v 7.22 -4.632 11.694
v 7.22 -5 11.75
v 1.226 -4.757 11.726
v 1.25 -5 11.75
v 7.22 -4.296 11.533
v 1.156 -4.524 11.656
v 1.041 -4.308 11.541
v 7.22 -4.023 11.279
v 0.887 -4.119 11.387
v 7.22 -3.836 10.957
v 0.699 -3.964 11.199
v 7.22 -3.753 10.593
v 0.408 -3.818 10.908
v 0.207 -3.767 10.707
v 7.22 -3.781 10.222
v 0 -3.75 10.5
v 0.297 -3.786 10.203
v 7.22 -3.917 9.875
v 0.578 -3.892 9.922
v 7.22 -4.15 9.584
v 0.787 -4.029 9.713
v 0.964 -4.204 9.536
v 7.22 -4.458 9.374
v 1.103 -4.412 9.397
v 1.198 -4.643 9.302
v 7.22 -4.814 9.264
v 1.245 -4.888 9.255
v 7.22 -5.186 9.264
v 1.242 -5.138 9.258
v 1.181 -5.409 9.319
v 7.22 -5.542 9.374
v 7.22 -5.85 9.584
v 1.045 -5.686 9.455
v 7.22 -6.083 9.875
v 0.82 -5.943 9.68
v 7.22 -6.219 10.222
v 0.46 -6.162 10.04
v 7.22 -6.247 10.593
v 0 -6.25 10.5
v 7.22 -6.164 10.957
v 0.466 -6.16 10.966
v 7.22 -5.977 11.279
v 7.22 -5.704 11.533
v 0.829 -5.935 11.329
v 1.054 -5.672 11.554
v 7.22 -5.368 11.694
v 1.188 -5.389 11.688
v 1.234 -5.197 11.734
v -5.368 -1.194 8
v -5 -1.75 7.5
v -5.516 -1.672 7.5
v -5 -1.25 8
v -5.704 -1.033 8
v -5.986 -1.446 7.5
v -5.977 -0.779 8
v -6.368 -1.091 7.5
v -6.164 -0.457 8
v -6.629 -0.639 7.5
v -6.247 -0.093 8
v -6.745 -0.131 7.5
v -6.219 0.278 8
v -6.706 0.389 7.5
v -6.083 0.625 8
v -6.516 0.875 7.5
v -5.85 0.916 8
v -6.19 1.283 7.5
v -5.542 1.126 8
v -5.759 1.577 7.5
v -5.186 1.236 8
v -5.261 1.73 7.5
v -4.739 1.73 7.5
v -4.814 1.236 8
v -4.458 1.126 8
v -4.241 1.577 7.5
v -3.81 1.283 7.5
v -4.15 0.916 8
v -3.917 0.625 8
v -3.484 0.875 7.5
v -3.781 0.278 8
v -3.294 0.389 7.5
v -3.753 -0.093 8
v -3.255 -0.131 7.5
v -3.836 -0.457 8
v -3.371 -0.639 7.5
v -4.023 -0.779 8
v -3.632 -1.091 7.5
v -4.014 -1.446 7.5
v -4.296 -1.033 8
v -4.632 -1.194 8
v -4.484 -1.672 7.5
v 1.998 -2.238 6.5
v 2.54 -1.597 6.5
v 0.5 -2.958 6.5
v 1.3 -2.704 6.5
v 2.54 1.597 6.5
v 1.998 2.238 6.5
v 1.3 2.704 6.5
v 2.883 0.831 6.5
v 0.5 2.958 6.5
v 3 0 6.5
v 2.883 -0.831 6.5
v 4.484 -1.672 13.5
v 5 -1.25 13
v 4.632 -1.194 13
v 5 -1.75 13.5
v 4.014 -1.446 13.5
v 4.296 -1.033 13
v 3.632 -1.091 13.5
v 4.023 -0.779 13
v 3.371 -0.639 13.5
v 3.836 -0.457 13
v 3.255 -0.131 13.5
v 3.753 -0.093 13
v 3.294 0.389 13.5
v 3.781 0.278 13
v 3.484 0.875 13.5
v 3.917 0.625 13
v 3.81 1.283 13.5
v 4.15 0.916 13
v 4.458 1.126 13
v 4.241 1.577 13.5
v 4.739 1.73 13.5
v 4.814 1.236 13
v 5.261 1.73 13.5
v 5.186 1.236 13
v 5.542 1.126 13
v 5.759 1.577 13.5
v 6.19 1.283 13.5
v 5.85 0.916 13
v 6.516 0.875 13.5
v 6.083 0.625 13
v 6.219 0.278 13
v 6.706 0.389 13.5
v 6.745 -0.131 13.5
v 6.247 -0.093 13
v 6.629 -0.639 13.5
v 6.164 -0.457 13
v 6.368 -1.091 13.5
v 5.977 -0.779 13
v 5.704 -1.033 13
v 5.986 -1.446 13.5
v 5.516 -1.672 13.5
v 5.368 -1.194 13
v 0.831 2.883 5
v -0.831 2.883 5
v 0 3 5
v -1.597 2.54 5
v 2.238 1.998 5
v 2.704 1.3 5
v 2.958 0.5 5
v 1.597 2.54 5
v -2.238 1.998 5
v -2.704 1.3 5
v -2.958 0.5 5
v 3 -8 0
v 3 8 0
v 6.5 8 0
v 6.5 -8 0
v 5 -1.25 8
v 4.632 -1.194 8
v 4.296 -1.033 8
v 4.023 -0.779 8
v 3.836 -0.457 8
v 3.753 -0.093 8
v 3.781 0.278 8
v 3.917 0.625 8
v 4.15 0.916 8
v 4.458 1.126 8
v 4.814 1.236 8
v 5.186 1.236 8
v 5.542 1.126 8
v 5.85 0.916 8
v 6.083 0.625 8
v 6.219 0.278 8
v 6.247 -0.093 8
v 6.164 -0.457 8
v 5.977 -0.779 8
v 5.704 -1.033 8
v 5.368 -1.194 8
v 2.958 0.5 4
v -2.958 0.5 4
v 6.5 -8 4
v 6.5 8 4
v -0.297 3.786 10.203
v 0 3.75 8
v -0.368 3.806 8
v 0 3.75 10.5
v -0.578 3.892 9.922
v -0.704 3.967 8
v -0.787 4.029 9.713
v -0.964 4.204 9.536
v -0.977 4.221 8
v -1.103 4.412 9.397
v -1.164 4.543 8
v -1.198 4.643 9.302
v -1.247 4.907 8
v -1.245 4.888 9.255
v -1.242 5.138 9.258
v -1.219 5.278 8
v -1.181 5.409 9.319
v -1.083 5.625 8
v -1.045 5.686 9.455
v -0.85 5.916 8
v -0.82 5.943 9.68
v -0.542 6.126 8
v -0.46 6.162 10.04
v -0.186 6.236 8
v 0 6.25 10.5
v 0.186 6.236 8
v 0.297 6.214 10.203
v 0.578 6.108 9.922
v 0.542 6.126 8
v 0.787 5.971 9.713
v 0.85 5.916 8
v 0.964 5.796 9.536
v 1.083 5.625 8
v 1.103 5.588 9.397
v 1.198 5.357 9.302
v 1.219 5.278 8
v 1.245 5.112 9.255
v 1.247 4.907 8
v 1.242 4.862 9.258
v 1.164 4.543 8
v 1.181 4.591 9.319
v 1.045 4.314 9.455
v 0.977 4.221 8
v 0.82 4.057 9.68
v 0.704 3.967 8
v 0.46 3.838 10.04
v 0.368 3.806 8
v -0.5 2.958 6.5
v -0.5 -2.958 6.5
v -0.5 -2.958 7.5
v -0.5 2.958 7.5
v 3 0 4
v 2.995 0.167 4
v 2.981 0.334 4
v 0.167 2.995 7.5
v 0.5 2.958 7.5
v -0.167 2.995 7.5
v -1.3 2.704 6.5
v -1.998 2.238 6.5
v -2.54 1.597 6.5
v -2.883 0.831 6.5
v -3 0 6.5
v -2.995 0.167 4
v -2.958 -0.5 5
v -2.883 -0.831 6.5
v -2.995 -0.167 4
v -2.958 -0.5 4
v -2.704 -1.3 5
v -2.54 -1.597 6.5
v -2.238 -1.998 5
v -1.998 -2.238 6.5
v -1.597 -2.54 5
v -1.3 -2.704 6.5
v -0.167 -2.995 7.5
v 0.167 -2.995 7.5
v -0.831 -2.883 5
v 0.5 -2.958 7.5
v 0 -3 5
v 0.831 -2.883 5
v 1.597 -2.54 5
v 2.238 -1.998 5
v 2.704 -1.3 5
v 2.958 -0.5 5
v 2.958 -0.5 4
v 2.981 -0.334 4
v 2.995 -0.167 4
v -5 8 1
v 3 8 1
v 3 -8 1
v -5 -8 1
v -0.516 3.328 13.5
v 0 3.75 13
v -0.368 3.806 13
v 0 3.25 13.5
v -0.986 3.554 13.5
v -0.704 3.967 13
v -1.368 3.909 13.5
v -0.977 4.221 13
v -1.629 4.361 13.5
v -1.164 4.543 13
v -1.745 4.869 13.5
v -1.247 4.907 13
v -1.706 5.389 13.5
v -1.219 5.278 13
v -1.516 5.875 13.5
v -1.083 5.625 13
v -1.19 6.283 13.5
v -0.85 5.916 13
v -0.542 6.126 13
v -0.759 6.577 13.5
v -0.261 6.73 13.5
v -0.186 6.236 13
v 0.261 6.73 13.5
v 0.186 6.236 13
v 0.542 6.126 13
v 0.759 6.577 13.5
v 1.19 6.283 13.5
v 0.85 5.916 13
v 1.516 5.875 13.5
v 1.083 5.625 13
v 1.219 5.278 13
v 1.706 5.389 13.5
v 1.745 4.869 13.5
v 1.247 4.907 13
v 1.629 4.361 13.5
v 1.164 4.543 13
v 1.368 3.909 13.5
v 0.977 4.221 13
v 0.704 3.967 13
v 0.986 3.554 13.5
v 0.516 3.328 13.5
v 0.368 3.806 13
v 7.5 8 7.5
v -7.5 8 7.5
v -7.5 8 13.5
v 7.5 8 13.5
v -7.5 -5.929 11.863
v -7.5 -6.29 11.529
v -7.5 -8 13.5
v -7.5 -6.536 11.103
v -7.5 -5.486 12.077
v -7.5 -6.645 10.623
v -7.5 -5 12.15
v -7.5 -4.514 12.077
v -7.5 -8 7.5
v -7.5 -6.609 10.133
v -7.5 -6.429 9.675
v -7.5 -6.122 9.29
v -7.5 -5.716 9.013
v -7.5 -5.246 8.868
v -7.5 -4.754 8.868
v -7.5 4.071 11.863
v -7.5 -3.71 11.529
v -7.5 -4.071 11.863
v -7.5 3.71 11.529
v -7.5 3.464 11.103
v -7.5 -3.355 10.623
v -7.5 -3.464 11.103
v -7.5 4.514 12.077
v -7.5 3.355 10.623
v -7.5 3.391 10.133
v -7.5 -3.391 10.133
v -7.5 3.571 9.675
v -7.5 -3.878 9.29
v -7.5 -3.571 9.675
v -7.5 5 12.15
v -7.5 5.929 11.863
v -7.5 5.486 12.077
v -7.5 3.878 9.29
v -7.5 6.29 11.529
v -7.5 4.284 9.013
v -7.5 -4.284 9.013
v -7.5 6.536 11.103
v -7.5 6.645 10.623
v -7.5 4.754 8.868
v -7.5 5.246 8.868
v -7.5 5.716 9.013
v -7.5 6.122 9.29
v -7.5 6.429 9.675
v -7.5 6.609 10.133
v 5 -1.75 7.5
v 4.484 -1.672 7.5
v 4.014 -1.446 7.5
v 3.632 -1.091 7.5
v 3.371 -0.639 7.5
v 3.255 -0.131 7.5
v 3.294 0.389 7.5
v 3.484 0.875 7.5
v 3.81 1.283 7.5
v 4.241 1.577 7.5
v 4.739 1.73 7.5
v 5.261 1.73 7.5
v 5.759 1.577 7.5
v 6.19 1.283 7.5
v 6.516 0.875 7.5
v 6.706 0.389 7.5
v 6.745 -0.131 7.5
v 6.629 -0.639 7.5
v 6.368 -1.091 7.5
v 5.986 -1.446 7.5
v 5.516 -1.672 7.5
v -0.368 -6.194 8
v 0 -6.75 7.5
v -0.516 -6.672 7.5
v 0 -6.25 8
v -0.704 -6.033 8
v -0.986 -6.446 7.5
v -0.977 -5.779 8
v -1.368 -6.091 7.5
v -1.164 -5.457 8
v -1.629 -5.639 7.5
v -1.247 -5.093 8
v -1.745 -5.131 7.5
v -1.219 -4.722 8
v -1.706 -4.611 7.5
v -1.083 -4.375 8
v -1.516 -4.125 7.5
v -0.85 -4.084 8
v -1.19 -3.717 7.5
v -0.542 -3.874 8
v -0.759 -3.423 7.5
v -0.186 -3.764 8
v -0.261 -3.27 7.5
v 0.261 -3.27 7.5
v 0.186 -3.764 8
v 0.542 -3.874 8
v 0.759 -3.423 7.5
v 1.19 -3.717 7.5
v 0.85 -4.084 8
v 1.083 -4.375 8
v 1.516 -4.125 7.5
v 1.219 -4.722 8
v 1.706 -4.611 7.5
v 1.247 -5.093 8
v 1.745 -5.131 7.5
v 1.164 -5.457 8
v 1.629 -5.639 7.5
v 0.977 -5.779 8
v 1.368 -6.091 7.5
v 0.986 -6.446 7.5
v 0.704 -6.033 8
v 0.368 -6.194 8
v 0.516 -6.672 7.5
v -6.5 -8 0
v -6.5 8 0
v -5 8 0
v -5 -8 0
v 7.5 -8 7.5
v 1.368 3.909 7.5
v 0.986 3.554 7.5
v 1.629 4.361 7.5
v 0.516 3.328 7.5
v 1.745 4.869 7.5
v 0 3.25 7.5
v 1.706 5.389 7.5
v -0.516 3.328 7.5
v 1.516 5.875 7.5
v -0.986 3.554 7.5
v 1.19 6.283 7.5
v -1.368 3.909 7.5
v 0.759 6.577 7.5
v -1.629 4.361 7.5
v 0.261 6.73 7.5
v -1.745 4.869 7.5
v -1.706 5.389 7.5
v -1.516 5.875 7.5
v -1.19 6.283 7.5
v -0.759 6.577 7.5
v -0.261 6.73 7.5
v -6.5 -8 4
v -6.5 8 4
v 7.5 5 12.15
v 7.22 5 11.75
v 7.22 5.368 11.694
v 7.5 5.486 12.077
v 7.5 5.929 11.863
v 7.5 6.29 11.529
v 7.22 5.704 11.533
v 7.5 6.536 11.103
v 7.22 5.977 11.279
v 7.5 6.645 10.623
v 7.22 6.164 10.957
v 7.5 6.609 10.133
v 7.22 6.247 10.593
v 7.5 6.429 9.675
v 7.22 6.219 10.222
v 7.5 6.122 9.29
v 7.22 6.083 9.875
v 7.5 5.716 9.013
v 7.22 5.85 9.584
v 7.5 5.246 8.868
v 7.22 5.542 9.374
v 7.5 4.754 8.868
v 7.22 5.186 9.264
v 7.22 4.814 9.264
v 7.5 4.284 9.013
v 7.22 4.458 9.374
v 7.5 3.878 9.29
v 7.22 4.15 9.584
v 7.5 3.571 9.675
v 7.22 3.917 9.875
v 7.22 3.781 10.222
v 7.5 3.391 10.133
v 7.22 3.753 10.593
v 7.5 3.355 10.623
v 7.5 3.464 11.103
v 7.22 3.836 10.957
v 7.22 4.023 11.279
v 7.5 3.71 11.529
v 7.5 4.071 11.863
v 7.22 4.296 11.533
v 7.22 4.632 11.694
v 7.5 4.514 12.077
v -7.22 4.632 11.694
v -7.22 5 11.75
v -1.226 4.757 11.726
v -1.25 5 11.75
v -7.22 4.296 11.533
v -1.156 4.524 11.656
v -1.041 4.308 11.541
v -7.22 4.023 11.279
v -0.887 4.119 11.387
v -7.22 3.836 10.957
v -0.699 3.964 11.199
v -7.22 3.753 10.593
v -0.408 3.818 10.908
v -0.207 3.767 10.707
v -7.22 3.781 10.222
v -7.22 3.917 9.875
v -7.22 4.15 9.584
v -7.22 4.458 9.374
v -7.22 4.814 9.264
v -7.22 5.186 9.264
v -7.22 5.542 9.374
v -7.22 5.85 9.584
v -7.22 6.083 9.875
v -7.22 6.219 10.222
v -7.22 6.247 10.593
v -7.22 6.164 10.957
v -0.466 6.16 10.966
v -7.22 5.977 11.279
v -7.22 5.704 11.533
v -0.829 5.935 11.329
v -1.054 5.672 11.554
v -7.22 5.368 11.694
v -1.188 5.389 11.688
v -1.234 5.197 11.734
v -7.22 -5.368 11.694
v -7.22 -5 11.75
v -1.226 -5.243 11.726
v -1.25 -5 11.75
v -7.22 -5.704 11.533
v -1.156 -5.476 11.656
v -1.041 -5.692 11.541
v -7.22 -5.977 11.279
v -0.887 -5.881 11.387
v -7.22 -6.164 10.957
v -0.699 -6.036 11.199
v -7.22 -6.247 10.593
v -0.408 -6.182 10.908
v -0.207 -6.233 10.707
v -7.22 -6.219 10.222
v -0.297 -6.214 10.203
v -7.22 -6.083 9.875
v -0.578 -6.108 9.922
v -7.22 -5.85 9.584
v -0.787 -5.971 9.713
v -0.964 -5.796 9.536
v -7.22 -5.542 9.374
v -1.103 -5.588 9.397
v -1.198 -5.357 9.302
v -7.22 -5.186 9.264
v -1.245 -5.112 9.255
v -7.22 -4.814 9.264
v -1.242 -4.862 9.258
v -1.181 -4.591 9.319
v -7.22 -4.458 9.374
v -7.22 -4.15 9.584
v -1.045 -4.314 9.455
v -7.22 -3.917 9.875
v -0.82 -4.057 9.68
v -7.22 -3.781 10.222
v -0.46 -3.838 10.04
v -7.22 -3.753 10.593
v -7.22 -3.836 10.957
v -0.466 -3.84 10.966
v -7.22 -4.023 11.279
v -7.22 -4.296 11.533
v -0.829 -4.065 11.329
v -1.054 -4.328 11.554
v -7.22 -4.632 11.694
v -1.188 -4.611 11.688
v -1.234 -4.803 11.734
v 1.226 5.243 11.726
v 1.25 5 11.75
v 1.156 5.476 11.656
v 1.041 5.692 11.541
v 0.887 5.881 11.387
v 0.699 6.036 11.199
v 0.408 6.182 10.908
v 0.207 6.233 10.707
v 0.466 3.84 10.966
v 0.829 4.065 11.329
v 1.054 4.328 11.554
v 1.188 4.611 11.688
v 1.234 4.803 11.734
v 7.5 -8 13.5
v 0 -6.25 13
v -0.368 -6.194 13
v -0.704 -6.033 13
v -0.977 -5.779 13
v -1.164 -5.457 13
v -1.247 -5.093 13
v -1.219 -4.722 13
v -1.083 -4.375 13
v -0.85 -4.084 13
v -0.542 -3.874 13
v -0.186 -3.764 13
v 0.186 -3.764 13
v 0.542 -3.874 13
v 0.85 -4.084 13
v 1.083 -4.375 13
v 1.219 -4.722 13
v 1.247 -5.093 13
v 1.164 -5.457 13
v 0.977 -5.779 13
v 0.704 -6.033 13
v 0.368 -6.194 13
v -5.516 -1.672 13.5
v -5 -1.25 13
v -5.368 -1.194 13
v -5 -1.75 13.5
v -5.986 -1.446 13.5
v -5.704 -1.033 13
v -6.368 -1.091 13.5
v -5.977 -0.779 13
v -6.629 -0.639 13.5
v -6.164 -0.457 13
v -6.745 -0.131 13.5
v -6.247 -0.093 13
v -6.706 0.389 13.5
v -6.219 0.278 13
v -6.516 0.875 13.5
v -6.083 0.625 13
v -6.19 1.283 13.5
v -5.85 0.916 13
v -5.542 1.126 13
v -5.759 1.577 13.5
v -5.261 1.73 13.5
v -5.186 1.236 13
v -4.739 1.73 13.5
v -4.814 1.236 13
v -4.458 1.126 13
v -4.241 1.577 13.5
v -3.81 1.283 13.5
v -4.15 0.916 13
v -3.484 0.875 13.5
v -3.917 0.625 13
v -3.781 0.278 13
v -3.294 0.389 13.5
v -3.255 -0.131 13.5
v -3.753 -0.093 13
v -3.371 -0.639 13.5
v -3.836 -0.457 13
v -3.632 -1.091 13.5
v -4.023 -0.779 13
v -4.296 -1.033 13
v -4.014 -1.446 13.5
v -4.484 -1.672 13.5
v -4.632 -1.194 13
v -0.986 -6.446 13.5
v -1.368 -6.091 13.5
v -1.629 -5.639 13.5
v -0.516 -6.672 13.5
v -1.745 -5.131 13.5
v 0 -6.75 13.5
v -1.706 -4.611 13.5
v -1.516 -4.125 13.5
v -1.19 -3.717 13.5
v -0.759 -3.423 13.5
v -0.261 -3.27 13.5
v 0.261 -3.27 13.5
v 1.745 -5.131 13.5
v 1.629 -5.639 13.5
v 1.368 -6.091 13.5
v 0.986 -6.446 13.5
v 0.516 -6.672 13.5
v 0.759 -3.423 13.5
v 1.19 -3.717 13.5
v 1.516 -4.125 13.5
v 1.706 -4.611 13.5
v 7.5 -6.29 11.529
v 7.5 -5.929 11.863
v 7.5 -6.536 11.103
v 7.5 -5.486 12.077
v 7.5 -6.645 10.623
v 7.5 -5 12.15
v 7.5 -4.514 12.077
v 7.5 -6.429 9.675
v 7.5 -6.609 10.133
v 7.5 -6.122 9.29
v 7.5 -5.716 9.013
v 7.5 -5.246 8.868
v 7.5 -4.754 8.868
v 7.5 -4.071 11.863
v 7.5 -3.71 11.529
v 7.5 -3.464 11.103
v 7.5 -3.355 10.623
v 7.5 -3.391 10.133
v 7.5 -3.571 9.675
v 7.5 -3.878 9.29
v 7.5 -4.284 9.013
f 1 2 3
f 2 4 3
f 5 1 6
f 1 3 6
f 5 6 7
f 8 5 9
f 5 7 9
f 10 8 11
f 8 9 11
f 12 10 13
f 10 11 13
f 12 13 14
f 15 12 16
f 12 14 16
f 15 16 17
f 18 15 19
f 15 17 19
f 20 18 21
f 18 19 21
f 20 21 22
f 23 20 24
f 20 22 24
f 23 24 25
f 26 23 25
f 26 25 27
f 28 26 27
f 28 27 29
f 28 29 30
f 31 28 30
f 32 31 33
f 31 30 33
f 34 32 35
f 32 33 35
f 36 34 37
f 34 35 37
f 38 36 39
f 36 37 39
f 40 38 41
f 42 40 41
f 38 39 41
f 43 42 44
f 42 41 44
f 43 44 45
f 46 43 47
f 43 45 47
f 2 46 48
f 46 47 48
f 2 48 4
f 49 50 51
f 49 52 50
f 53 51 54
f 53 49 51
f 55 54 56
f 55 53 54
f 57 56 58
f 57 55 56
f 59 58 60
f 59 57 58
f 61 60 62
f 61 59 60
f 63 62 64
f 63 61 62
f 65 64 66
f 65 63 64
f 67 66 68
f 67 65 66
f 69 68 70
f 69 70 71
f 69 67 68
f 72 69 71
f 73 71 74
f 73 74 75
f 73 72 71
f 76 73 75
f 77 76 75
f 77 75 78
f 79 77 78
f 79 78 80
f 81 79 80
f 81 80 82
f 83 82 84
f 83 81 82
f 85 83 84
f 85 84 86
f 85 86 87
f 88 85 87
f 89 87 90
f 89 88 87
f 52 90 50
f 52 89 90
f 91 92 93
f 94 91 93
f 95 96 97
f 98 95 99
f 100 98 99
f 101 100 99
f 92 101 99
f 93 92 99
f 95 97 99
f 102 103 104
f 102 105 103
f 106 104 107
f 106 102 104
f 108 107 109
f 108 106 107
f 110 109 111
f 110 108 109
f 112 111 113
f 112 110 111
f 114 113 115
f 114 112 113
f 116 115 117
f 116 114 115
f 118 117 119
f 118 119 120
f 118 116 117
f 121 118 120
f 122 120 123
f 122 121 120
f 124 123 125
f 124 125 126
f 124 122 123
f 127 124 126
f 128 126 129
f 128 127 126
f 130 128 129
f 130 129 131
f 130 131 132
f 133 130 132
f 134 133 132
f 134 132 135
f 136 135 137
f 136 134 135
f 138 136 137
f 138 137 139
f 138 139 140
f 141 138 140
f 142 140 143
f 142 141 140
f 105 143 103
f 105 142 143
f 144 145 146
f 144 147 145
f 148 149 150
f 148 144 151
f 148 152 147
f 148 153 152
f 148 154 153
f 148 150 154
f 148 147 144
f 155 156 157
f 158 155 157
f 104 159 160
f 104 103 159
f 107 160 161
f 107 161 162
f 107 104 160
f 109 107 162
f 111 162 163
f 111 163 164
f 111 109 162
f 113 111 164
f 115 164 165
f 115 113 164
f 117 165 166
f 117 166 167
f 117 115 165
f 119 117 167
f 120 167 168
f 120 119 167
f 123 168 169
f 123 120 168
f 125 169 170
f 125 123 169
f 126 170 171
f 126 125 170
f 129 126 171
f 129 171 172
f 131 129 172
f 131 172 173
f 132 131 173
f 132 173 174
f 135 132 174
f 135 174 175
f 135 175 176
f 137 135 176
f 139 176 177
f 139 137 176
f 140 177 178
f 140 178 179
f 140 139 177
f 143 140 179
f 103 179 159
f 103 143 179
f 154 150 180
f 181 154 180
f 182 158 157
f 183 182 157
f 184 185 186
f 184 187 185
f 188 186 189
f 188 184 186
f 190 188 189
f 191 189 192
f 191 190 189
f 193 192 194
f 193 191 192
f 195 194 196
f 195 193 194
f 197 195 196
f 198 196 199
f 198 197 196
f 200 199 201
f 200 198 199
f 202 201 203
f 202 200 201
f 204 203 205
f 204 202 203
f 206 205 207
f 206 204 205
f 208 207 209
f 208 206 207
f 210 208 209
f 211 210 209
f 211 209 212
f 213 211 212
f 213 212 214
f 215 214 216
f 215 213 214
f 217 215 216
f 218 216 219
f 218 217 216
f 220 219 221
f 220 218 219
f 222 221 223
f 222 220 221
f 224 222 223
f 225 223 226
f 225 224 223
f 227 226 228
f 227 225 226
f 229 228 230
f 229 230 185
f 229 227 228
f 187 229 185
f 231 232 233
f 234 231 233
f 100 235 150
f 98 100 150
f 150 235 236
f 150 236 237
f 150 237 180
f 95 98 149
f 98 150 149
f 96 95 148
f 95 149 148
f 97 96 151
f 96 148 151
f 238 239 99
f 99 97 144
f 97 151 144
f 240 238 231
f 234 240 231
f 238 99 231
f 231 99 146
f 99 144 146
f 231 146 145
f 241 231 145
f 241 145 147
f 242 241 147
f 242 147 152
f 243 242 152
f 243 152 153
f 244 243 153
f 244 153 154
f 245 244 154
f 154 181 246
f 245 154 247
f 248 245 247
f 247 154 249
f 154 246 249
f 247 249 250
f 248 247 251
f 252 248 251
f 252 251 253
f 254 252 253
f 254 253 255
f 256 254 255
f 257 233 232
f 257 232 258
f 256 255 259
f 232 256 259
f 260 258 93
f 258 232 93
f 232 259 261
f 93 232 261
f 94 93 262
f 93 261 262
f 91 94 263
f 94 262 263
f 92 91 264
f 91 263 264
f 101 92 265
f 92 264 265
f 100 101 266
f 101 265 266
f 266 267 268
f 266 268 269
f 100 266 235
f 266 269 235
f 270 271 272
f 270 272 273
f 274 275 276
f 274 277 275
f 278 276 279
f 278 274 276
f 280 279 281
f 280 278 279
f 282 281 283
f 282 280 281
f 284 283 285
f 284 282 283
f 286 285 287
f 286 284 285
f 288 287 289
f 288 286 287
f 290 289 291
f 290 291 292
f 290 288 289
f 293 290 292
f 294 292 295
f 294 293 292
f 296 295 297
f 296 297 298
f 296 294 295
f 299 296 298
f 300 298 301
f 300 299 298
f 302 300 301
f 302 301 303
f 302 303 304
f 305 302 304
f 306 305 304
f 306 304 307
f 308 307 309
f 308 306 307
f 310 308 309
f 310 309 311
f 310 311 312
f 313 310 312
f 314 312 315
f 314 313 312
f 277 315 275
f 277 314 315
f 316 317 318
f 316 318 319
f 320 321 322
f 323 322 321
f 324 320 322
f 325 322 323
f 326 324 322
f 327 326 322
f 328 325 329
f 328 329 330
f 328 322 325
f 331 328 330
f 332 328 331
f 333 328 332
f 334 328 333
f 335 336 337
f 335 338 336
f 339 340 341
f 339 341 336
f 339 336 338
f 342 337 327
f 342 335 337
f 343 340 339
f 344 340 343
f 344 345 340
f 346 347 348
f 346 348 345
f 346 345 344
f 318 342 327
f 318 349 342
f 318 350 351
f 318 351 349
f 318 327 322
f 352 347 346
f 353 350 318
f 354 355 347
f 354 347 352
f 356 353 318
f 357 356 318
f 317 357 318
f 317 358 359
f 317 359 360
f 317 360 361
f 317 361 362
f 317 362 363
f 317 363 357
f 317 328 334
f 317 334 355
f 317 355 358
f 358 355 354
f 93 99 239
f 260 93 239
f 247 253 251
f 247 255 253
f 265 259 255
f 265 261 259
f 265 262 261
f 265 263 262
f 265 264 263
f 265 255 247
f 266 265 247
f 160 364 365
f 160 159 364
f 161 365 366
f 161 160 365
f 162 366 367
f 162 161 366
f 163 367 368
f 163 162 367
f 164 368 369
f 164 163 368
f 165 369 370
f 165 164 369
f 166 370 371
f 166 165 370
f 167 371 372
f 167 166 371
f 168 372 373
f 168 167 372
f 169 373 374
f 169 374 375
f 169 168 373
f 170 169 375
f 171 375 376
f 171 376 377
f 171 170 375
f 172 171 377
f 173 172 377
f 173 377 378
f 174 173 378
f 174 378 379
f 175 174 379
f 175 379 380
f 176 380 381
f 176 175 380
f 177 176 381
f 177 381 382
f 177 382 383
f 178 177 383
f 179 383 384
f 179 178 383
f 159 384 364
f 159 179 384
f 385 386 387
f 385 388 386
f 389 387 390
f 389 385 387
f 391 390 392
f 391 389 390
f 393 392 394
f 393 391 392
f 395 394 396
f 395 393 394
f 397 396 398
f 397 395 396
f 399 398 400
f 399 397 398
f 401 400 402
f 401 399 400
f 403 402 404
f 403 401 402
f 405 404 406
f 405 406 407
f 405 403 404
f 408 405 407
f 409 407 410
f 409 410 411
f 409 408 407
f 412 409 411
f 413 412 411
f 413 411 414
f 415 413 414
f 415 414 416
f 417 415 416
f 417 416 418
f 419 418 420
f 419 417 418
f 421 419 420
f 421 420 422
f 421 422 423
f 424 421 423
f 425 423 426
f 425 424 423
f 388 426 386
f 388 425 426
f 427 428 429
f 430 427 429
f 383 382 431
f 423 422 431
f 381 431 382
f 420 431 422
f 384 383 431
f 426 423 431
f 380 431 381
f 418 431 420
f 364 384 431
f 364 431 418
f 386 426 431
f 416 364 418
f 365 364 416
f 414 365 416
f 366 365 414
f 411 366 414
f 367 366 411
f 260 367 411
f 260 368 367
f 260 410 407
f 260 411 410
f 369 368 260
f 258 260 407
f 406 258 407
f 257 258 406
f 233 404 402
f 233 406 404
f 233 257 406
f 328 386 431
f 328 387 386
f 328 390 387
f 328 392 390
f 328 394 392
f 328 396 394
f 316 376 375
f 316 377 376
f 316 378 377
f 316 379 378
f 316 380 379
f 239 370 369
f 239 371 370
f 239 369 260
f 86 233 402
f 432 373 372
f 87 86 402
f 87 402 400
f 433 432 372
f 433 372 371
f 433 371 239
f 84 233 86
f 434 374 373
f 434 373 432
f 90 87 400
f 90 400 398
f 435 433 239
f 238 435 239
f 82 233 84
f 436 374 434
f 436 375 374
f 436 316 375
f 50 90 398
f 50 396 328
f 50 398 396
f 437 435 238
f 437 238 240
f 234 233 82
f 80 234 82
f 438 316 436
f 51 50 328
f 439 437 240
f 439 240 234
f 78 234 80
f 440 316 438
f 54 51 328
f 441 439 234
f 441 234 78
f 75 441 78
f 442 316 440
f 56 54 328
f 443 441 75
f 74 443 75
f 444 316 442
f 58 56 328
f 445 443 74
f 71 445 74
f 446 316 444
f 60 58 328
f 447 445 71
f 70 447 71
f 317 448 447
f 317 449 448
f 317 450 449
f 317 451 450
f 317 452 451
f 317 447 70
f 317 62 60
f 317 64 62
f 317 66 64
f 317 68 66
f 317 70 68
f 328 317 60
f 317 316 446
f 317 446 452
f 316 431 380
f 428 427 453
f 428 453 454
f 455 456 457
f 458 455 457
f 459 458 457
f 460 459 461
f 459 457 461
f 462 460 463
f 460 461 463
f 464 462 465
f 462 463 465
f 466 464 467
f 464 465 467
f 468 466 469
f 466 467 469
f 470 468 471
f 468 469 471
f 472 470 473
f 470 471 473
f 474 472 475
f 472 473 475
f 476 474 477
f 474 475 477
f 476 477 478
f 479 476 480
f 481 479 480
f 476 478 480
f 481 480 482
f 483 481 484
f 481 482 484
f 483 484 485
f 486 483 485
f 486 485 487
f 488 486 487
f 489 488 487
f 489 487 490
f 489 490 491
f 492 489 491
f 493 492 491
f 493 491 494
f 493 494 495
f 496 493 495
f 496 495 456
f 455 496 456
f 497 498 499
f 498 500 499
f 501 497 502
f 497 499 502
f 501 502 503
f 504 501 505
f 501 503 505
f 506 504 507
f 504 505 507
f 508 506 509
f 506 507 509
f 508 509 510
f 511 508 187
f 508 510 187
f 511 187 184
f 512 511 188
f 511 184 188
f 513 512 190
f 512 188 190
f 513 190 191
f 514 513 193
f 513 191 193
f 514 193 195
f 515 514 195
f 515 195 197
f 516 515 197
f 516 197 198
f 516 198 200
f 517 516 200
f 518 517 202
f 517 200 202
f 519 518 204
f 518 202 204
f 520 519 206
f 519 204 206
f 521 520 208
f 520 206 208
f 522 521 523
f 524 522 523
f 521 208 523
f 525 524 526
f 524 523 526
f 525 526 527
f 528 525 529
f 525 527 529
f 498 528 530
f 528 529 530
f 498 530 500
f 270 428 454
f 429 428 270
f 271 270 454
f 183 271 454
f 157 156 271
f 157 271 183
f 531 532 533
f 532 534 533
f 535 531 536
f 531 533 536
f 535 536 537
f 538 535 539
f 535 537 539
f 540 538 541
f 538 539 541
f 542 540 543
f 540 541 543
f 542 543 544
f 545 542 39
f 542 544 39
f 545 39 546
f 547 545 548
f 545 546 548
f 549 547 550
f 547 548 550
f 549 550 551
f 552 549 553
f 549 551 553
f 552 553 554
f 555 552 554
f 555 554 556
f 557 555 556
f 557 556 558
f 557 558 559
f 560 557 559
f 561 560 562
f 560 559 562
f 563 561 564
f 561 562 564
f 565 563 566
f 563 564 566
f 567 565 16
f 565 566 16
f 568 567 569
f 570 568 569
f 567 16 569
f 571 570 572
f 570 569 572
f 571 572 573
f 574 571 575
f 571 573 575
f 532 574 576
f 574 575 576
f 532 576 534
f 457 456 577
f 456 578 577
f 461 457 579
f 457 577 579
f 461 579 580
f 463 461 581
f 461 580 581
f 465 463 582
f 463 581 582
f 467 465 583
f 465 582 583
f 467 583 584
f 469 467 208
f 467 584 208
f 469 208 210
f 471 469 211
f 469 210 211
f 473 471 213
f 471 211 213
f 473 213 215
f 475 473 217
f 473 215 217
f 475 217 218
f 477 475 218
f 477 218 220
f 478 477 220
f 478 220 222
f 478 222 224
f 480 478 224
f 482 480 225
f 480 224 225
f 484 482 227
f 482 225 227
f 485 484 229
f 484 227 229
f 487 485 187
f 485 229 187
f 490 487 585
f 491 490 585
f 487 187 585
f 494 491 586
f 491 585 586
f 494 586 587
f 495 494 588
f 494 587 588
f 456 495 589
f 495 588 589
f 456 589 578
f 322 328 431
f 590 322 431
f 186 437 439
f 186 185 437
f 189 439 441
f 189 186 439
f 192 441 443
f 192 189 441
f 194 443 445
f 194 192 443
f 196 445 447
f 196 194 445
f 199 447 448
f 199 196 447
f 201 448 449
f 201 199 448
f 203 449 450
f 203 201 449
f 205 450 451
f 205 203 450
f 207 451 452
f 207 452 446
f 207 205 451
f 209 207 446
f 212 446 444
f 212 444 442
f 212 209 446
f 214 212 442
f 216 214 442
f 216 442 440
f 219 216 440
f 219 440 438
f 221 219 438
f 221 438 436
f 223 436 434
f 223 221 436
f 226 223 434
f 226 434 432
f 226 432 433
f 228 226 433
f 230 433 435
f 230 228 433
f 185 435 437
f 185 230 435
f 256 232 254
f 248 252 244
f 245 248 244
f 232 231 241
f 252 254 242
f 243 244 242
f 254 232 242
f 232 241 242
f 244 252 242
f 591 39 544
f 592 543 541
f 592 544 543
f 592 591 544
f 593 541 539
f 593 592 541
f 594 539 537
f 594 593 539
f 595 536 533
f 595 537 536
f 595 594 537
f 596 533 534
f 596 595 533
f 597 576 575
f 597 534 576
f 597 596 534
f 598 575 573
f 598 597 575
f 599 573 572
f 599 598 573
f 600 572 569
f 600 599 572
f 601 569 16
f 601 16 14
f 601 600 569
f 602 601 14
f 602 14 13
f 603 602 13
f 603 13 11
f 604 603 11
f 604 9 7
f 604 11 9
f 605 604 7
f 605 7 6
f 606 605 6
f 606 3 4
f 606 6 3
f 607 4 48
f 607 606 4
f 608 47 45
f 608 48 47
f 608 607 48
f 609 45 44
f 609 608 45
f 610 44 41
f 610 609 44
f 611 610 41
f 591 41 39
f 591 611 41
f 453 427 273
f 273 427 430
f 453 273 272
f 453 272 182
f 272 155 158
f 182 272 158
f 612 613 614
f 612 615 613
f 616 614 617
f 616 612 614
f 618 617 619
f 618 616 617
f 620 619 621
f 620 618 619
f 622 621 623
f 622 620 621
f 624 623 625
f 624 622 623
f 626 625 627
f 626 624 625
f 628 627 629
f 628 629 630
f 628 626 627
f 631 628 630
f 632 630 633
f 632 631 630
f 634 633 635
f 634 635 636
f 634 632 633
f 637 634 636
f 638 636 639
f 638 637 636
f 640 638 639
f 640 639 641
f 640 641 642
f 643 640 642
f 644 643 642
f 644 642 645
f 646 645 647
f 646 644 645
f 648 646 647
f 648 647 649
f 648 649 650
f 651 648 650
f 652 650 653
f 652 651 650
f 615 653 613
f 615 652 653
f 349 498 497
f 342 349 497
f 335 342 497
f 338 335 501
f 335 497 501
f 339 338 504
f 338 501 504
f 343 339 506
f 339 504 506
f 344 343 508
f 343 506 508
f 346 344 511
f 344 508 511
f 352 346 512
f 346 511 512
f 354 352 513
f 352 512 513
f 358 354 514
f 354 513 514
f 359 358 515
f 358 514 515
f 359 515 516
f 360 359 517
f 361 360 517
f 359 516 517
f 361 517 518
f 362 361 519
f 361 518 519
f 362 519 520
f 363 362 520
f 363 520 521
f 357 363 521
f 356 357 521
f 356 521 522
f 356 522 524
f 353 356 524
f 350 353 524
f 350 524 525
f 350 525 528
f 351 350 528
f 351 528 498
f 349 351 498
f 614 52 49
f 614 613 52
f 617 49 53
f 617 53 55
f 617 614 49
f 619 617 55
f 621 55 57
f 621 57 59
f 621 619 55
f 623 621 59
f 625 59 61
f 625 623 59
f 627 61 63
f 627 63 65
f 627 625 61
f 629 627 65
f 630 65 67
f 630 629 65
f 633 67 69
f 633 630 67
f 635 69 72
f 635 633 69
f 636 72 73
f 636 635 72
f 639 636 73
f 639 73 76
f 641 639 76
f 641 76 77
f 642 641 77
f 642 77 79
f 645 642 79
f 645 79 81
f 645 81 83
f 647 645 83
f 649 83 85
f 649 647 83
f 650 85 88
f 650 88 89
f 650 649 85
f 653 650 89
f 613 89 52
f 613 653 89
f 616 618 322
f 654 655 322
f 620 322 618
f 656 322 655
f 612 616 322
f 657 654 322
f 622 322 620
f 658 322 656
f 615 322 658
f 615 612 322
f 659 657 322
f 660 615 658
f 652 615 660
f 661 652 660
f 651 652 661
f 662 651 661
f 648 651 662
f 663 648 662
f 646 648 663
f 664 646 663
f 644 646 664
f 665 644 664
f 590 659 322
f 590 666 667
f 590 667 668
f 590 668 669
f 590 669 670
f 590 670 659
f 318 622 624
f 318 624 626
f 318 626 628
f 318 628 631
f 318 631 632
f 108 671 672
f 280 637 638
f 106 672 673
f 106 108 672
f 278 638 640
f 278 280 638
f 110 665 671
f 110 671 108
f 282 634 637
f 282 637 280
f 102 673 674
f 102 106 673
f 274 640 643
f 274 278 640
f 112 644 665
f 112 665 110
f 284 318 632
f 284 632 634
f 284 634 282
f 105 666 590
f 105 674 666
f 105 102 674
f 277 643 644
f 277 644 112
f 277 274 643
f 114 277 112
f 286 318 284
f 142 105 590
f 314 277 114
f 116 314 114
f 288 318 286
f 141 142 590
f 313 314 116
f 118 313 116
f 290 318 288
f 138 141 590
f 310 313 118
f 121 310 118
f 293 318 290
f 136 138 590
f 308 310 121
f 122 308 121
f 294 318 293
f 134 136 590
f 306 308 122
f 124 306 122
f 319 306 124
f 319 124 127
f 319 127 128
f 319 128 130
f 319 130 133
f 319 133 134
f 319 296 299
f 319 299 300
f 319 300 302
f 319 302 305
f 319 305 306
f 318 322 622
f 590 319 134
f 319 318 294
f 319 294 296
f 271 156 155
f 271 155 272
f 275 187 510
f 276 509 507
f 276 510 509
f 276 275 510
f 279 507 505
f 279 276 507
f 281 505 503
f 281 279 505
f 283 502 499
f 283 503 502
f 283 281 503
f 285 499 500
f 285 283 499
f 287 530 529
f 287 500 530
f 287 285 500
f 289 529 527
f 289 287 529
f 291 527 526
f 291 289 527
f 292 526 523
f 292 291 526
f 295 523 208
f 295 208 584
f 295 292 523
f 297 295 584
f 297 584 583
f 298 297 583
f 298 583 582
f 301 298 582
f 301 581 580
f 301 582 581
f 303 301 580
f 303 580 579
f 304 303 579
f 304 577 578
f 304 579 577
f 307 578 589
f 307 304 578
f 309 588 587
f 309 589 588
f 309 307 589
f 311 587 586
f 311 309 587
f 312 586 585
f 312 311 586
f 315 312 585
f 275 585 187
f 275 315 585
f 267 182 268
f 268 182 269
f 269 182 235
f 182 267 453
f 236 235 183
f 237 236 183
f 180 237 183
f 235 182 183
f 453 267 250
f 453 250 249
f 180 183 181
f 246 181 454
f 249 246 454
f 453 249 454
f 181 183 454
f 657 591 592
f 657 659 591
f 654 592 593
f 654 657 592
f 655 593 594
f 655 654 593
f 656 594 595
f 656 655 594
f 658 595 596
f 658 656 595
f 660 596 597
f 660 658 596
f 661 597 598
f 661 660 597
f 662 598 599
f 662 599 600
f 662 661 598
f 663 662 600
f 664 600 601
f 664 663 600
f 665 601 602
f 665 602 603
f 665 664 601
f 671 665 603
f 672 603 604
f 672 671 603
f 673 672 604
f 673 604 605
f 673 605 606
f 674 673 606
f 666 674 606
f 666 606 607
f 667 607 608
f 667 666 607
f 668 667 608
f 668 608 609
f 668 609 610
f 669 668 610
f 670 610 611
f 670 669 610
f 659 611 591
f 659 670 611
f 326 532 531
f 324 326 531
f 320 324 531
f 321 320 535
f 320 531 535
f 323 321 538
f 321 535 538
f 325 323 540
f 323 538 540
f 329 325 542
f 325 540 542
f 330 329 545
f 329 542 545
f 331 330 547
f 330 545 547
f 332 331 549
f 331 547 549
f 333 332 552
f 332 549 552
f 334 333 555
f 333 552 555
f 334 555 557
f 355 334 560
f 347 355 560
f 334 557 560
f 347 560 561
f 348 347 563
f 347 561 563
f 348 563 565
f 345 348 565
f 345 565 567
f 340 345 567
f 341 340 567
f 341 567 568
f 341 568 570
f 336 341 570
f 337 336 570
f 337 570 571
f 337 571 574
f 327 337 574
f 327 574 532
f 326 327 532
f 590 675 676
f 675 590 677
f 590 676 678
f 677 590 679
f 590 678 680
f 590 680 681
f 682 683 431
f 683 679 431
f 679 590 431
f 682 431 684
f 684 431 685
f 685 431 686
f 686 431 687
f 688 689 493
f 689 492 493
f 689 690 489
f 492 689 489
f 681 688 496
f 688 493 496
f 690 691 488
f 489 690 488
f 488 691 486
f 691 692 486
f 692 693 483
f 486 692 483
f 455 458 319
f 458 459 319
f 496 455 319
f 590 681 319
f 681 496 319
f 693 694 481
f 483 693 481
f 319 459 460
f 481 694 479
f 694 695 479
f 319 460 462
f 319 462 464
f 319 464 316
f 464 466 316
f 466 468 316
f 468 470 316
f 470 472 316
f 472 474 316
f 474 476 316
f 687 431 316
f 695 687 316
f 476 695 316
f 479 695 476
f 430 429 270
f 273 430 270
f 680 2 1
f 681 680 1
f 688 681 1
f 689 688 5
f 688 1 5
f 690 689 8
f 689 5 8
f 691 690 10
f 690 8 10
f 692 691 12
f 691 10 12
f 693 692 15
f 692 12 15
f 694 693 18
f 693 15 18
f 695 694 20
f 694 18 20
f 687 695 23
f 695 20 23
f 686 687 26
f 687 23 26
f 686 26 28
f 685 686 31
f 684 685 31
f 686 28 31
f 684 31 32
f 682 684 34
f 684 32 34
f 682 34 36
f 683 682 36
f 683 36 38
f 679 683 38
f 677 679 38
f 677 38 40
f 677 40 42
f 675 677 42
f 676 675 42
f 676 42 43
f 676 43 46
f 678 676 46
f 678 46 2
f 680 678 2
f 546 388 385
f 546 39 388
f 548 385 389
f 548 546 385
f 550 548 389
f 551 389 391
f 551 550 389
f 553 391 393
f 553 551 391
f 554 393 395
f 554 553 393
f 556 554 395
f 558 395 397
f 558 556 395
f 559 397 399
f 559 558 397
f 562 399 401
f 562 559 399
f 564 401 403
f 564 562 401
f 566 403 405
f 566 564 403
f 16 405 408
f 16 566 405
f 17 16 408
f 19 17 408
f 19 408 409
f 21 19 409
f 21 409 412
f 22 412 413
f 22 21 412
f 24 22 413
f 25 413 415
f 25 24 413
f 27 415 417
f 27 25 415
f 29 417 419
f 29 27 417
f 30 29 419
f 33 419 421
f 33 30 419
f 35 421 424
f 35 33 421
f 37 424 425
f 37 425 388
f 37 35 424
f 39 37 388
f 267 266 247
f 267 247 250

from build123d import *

# Parameters (mm, degrees)
SKETCH_1_W                  = 15
SKETCH_1_H                  = 16
EXTRUDE_1_DEPTH             = 13.5
SKETCH_2_W                  = 1
SKETCH_2_H                  = 16
CUT_EXTRUDE_2_DEPTH         = 7.5
SKETCH_4_W                  = 3.5
SKETCH_4_H                  = 5
CUT_EXTRUDE_4_DEPTH         = 15
SKETCH_5_W                  = 3.5
SKETCH_5_H                  = 3.5
CUT_EXTRUDE_9_DEPTH         = 6
CUT_EXTRUDE_10_REACH        = 13
SKETCH_6_W                  = 2.5
SKETCH_6_H                  = 1
SKETCH_7_W                  = 1
SKETCH_7_H                  = 2.5
CUT_EXTRUDE_11_DEPTH        = 11.5
SKETCH_8_W                  = 8
SKETCH_8_H                  = 1
CUT_EXTRUDE_12_DEPTH        = 17
HOLE_WIZARD_M31_AT_2_COUNT  = 2
HOLE_WIZARD_M31_AT_2_PITCH  = 10
HOLE_WIZARD_M31_AT_3_COUNT  = 2
HOLE_WIZARD_M31_AT_3_PITCH  = 7.071067812
HOLE_WIZARD_M31_AT_4_COUNT  = 2
HOLE_WIZARD_M31_AT_4_PITCH  = 7.071067812
HOLE_WIZARD_M33_D           = 2.5
HOLE_WIZARD_M33_DEPTH       = 7.5
HOLE_WIZARD_M33_CSINK_D     = 3.3
HOLE_WIZARD_M33_CSINK_ANGLE = 110
HOLE_WIZARD_M33_TIP         = 0.751075774
SKETCH_11_W                 = 7.5
SKETCH_11_H                 = 3.5
HOLE_WIZARD_M35_D           = 2.5
HOLE_WIZARD_M35_DEPTH       = 7.5
HOLE_WIZARD_M35_CSINK_D     = 3.3
HOLE_WIZARD_M35_CSINK_ANGLE = 110
HOLE_WIZARD_M35_TIP         = 0.751075774


with BuildPart() as part:
    # Эскиз1 → Вытянуть1 (new body)
    with BuildSketch(Plane.XY):
        Rectangle(SKETCH_1_W, SKETCH_1_H)
    extrude(amount=EXTRUDE_1_DEPTH)

    # Эскиз2 → Вырез-Вытянуть2 (cut)
    with BuildSketch(Plane(origin=(0, 0, 0), x_dir=(-1, 0, 0), z_dir=(0, 0, -1))):
        with Locations((7, 0)):
            Rectangle(SKETCH_2_W, SKETCH_2_H)
        with Locations((-7, 0)):
            Rectangle(SKETCH_2_W, SKETCH_2_H)
    extrude(amount=-CUT_EXTRUDE_2_DEPTH, mode=Mode.SUBTRACT)

    # Эскиз4 → Вырез-Вытянуть4 (cut, through all)
    with BuildSketch(Plane.ZY.offset(6.5)):
        with Locations((5.75, 5.5)):
            Rectangle(SKETCH_4_W, SKETCH_4_H)
        with Locations((5.75, -5.5)):
            Rectangle(SKETCH_4_W, SKETCH_4_H)
    extrude(amount=-CUT_EXTRUDE_4_DEPTH, mode=Mode.SUBTRACT)

    # Эскиз5 → Вырез-Вытянуть9 (cut)
    with BuildSketch(Plane(origin=(0, 3, 0), x_dir=(-1, 0, 0), z_dir=(0, 1, 0))):
        with Locations((-4.75, 5.75)):
            Rectangle(SKETCH_5_W, SKETCH_5_H)
        with Locations((4.75, 5.75)):
            Rectangle(SKETCH_5_W, SKETCH_5_H)
    extrude(amount=-CUT_EXTRUDE_9_DEPTH, mode=Mode.SUBTRACT)

    # Эскиз6 → Вырез-Вытянуть10 (cut, up to next)
    with BuildSketch(Plane(origin=(0, 3, 0), x_dir=(-1, 0, 0), z_dir=(0, 1, 0)), mode=Mode.PRIVATE) as cut_extrude_10_sk1:
        with Locations((-1.75, 7)):
            Rectangle(SKETCH_6_W, SKETCH_6_H)
    cut_extrude_10_tool1 = extrude(cut_extrude_10_sk1.sketch, amount=-CUT_EXTRUDE_10_REACH, mode=Mode.PRIVATE) & part.part
    add(cut_extrude_10_tool1.solids().sort_by_distance((1.75, 3, 7))[0], mode=Mode.SUBTRACT)
    # Эскиз6 → Вырез-Вытянуть10 (cut, up to next)
    with BuildSketch(Plane(origin=(0, 3, 0), x_dir=(-1, 0, 0), z_dir=(0, 1, 0)), mode=Mode.PRIVATE) as cut_extrude_10_sk2:
        with Locations((1.75, 7)):
            Rectangle(SKETCH_6_W, SKETCH_6_H)
    cut_extrude_10_tool2 = extrude(cut_extrude_10_sk2.sketch, amount=-CUT_EXTRUDE_10_REACH, mode=Mode.PRIVATE) & part.part
    add(cut_extrude_10_tool2.solids().sort_by_distance((-1.75, 3, 7))[0], mode=Mode.SUBTRACT)

    # Эскиз7 → Вырез-Вытянуть11 (cut, through all)
    with BuildSketch(Plane(origin=(3, 0, 0), x_dir=(0, 0, -1), z_dir=(1, 0, 0))):
        with Locations((-4.5, 1.75)):
            Rectangle(SKETCH_7_W, SKETCH_7_H)
        with Locations((-4.5, -1.75)):
            Rectangle(SKETCH_7_W, SKETCH_7_H)
    extrude(amount=-CUT_EXTRUDE_11_DEPTH, mode=Mode.SUBTRACT)

    # Эскиз8 → Вырез-Вытянуть12 (cut, through all)
    with BuildSketch(Plane(origin=(0, 8, 0), x_dir=(-1, 0, 0), z_dir=(0, 1, 0))):
        with Locations((1, 0.5)):
            Rectangle(SKETCH_8_W, SKETCH_8_H)
    extrude(amount=-CUT_EXTRUDE_12_DEPTH, mode=Mode.SUBTRACT)

    # Эскиз9 → Отверстие обработанное метчиком M31 (revolve, cut)
    with BuildSketch(Plane(origin=(0, -5, 13.5), x_dir=(0, -1, 0), z_dir=(1, 0, 0))):
        Polygon((0, 0), (0, 6), (1.75, 6), (1.25, 5.5), (1.25, 0.5), (1.75, 0), align=None)
    hole_wizard_m31 = revolve(axis=Axis((0, -5, 19.85), (0, 0, -1)), mode=Mode.SUBTRACT)

    # Отверстие обработанное метчиком M31 at 2: Отверстие обработанное метчиком M31 ×2
    with Locations(*[(0, i * HOLE_WIZARD_M31_AT_2_PITCH, 0) for i in range(1, HOLE_WIZARD_M31_AT_2_COUNT)]):
        add(hole_wizard_m31, mode=Mode.SUBTRACT)

    # Отверстие обработанное метчиком M31 at 3: Отверстие обработанное метчиком M31 ×2
    with Locations(*[Vector(0.707106781, 0.707106781, 0) * (i * HOLE_WIZARD_M31_AT_3_PITCH) for i in range(1, HOLE_WIZARD_M31_AT_3_COUNT)]):
        add(hole_wizard_m31, mode=Mode.SUBTRACT)

    # Отверстие обработанное метчиком M31 at 4: Отверстие обработанное метчиком M31 ×2
    with Locations(*[Vector(-0.707106781, 0.707106781, 0) * (i * HOLE_WIZARD_M31_AT_4_PITCH) for i in range(1, HOLE_WIZARD_M31_AT_4_COUNT)]):
        add(hole_wizard_m31, mode=Mode.SUBTRACT)

    # Отверстие обработанное метчиком M33
    with Locations(Plane(origin=(-7.5, 5, 10.5), x_dir=(0, 0, -1), z_dir=(-1, 0, 0))):
        with Locations((0, 0), (0, 10)):
            CounterSinkHole(HOLE_WIZARD_M33_D / 2, HOLE_WIZARD_M33_CSINK_D / 2, depth=HOLE_WIZARD_M33_DEPTH, counter_sink_angle=HOLE_WIZARD_M33_CSINK_ANGLE)
            with Locations((0, 0, -(HOLE_WIZARD_M33_DEPTH + HOLE_WIZARD_M33_TIP / 2))):  # 118° drill point
                Cone(0, HOLE_WIZARD_M33_D / 2, HOLE_WIZARD_M33_TIP, mode=Mode.SUBTRACT)

    # Эскиз11 → Вырез-Повернуть1 (revolve, cut)
    with BuildSketch(Plane(origin=(0, 0, 0), x_dir=(1, 0, 0), z_dir=(0, 1, 0))):
        with Locations((6.75, -5.75)):
            Rectangle(SKETCH_11_W, SKETCH_11_H)
    revolve(axis=Axis((0, 0, 0), (0, 0, 1)), mode=Mode.SUBTRACT)

    # Отверстие обработанное метчиком M35
    with Locations(Plane(origin=(7.5, 6.867633096, -0.651107824), x_dir=(0, 0, -1), z_dir=(1, 0, 0))):
        with Locations((-11.151107824, -1.867633096), (-11.151107824, -11.867633096)):
            CounterSinkHole(HOLE_WIZARD_M35_D / 2, HOLE_WIZARD_M35_CSINK_D / 2, depth=HOLE_WIZARD_M35_DEPTH, counter_sink_angle=HOLE_WIZARD_M35_CSINK_ANGLE)
            with Locations((0, 0, -(HOLE_WIZARD_M35_DEPTH + HOLE_WIZARD_M35_TIP / 2))):  # 118° drill point
                Cone(0, HOLE_WIZARD_M35_D / 2, HOLE_WIZARD_M35_TIP, mode=Mode.SUBTRACT)


solid = part.part
